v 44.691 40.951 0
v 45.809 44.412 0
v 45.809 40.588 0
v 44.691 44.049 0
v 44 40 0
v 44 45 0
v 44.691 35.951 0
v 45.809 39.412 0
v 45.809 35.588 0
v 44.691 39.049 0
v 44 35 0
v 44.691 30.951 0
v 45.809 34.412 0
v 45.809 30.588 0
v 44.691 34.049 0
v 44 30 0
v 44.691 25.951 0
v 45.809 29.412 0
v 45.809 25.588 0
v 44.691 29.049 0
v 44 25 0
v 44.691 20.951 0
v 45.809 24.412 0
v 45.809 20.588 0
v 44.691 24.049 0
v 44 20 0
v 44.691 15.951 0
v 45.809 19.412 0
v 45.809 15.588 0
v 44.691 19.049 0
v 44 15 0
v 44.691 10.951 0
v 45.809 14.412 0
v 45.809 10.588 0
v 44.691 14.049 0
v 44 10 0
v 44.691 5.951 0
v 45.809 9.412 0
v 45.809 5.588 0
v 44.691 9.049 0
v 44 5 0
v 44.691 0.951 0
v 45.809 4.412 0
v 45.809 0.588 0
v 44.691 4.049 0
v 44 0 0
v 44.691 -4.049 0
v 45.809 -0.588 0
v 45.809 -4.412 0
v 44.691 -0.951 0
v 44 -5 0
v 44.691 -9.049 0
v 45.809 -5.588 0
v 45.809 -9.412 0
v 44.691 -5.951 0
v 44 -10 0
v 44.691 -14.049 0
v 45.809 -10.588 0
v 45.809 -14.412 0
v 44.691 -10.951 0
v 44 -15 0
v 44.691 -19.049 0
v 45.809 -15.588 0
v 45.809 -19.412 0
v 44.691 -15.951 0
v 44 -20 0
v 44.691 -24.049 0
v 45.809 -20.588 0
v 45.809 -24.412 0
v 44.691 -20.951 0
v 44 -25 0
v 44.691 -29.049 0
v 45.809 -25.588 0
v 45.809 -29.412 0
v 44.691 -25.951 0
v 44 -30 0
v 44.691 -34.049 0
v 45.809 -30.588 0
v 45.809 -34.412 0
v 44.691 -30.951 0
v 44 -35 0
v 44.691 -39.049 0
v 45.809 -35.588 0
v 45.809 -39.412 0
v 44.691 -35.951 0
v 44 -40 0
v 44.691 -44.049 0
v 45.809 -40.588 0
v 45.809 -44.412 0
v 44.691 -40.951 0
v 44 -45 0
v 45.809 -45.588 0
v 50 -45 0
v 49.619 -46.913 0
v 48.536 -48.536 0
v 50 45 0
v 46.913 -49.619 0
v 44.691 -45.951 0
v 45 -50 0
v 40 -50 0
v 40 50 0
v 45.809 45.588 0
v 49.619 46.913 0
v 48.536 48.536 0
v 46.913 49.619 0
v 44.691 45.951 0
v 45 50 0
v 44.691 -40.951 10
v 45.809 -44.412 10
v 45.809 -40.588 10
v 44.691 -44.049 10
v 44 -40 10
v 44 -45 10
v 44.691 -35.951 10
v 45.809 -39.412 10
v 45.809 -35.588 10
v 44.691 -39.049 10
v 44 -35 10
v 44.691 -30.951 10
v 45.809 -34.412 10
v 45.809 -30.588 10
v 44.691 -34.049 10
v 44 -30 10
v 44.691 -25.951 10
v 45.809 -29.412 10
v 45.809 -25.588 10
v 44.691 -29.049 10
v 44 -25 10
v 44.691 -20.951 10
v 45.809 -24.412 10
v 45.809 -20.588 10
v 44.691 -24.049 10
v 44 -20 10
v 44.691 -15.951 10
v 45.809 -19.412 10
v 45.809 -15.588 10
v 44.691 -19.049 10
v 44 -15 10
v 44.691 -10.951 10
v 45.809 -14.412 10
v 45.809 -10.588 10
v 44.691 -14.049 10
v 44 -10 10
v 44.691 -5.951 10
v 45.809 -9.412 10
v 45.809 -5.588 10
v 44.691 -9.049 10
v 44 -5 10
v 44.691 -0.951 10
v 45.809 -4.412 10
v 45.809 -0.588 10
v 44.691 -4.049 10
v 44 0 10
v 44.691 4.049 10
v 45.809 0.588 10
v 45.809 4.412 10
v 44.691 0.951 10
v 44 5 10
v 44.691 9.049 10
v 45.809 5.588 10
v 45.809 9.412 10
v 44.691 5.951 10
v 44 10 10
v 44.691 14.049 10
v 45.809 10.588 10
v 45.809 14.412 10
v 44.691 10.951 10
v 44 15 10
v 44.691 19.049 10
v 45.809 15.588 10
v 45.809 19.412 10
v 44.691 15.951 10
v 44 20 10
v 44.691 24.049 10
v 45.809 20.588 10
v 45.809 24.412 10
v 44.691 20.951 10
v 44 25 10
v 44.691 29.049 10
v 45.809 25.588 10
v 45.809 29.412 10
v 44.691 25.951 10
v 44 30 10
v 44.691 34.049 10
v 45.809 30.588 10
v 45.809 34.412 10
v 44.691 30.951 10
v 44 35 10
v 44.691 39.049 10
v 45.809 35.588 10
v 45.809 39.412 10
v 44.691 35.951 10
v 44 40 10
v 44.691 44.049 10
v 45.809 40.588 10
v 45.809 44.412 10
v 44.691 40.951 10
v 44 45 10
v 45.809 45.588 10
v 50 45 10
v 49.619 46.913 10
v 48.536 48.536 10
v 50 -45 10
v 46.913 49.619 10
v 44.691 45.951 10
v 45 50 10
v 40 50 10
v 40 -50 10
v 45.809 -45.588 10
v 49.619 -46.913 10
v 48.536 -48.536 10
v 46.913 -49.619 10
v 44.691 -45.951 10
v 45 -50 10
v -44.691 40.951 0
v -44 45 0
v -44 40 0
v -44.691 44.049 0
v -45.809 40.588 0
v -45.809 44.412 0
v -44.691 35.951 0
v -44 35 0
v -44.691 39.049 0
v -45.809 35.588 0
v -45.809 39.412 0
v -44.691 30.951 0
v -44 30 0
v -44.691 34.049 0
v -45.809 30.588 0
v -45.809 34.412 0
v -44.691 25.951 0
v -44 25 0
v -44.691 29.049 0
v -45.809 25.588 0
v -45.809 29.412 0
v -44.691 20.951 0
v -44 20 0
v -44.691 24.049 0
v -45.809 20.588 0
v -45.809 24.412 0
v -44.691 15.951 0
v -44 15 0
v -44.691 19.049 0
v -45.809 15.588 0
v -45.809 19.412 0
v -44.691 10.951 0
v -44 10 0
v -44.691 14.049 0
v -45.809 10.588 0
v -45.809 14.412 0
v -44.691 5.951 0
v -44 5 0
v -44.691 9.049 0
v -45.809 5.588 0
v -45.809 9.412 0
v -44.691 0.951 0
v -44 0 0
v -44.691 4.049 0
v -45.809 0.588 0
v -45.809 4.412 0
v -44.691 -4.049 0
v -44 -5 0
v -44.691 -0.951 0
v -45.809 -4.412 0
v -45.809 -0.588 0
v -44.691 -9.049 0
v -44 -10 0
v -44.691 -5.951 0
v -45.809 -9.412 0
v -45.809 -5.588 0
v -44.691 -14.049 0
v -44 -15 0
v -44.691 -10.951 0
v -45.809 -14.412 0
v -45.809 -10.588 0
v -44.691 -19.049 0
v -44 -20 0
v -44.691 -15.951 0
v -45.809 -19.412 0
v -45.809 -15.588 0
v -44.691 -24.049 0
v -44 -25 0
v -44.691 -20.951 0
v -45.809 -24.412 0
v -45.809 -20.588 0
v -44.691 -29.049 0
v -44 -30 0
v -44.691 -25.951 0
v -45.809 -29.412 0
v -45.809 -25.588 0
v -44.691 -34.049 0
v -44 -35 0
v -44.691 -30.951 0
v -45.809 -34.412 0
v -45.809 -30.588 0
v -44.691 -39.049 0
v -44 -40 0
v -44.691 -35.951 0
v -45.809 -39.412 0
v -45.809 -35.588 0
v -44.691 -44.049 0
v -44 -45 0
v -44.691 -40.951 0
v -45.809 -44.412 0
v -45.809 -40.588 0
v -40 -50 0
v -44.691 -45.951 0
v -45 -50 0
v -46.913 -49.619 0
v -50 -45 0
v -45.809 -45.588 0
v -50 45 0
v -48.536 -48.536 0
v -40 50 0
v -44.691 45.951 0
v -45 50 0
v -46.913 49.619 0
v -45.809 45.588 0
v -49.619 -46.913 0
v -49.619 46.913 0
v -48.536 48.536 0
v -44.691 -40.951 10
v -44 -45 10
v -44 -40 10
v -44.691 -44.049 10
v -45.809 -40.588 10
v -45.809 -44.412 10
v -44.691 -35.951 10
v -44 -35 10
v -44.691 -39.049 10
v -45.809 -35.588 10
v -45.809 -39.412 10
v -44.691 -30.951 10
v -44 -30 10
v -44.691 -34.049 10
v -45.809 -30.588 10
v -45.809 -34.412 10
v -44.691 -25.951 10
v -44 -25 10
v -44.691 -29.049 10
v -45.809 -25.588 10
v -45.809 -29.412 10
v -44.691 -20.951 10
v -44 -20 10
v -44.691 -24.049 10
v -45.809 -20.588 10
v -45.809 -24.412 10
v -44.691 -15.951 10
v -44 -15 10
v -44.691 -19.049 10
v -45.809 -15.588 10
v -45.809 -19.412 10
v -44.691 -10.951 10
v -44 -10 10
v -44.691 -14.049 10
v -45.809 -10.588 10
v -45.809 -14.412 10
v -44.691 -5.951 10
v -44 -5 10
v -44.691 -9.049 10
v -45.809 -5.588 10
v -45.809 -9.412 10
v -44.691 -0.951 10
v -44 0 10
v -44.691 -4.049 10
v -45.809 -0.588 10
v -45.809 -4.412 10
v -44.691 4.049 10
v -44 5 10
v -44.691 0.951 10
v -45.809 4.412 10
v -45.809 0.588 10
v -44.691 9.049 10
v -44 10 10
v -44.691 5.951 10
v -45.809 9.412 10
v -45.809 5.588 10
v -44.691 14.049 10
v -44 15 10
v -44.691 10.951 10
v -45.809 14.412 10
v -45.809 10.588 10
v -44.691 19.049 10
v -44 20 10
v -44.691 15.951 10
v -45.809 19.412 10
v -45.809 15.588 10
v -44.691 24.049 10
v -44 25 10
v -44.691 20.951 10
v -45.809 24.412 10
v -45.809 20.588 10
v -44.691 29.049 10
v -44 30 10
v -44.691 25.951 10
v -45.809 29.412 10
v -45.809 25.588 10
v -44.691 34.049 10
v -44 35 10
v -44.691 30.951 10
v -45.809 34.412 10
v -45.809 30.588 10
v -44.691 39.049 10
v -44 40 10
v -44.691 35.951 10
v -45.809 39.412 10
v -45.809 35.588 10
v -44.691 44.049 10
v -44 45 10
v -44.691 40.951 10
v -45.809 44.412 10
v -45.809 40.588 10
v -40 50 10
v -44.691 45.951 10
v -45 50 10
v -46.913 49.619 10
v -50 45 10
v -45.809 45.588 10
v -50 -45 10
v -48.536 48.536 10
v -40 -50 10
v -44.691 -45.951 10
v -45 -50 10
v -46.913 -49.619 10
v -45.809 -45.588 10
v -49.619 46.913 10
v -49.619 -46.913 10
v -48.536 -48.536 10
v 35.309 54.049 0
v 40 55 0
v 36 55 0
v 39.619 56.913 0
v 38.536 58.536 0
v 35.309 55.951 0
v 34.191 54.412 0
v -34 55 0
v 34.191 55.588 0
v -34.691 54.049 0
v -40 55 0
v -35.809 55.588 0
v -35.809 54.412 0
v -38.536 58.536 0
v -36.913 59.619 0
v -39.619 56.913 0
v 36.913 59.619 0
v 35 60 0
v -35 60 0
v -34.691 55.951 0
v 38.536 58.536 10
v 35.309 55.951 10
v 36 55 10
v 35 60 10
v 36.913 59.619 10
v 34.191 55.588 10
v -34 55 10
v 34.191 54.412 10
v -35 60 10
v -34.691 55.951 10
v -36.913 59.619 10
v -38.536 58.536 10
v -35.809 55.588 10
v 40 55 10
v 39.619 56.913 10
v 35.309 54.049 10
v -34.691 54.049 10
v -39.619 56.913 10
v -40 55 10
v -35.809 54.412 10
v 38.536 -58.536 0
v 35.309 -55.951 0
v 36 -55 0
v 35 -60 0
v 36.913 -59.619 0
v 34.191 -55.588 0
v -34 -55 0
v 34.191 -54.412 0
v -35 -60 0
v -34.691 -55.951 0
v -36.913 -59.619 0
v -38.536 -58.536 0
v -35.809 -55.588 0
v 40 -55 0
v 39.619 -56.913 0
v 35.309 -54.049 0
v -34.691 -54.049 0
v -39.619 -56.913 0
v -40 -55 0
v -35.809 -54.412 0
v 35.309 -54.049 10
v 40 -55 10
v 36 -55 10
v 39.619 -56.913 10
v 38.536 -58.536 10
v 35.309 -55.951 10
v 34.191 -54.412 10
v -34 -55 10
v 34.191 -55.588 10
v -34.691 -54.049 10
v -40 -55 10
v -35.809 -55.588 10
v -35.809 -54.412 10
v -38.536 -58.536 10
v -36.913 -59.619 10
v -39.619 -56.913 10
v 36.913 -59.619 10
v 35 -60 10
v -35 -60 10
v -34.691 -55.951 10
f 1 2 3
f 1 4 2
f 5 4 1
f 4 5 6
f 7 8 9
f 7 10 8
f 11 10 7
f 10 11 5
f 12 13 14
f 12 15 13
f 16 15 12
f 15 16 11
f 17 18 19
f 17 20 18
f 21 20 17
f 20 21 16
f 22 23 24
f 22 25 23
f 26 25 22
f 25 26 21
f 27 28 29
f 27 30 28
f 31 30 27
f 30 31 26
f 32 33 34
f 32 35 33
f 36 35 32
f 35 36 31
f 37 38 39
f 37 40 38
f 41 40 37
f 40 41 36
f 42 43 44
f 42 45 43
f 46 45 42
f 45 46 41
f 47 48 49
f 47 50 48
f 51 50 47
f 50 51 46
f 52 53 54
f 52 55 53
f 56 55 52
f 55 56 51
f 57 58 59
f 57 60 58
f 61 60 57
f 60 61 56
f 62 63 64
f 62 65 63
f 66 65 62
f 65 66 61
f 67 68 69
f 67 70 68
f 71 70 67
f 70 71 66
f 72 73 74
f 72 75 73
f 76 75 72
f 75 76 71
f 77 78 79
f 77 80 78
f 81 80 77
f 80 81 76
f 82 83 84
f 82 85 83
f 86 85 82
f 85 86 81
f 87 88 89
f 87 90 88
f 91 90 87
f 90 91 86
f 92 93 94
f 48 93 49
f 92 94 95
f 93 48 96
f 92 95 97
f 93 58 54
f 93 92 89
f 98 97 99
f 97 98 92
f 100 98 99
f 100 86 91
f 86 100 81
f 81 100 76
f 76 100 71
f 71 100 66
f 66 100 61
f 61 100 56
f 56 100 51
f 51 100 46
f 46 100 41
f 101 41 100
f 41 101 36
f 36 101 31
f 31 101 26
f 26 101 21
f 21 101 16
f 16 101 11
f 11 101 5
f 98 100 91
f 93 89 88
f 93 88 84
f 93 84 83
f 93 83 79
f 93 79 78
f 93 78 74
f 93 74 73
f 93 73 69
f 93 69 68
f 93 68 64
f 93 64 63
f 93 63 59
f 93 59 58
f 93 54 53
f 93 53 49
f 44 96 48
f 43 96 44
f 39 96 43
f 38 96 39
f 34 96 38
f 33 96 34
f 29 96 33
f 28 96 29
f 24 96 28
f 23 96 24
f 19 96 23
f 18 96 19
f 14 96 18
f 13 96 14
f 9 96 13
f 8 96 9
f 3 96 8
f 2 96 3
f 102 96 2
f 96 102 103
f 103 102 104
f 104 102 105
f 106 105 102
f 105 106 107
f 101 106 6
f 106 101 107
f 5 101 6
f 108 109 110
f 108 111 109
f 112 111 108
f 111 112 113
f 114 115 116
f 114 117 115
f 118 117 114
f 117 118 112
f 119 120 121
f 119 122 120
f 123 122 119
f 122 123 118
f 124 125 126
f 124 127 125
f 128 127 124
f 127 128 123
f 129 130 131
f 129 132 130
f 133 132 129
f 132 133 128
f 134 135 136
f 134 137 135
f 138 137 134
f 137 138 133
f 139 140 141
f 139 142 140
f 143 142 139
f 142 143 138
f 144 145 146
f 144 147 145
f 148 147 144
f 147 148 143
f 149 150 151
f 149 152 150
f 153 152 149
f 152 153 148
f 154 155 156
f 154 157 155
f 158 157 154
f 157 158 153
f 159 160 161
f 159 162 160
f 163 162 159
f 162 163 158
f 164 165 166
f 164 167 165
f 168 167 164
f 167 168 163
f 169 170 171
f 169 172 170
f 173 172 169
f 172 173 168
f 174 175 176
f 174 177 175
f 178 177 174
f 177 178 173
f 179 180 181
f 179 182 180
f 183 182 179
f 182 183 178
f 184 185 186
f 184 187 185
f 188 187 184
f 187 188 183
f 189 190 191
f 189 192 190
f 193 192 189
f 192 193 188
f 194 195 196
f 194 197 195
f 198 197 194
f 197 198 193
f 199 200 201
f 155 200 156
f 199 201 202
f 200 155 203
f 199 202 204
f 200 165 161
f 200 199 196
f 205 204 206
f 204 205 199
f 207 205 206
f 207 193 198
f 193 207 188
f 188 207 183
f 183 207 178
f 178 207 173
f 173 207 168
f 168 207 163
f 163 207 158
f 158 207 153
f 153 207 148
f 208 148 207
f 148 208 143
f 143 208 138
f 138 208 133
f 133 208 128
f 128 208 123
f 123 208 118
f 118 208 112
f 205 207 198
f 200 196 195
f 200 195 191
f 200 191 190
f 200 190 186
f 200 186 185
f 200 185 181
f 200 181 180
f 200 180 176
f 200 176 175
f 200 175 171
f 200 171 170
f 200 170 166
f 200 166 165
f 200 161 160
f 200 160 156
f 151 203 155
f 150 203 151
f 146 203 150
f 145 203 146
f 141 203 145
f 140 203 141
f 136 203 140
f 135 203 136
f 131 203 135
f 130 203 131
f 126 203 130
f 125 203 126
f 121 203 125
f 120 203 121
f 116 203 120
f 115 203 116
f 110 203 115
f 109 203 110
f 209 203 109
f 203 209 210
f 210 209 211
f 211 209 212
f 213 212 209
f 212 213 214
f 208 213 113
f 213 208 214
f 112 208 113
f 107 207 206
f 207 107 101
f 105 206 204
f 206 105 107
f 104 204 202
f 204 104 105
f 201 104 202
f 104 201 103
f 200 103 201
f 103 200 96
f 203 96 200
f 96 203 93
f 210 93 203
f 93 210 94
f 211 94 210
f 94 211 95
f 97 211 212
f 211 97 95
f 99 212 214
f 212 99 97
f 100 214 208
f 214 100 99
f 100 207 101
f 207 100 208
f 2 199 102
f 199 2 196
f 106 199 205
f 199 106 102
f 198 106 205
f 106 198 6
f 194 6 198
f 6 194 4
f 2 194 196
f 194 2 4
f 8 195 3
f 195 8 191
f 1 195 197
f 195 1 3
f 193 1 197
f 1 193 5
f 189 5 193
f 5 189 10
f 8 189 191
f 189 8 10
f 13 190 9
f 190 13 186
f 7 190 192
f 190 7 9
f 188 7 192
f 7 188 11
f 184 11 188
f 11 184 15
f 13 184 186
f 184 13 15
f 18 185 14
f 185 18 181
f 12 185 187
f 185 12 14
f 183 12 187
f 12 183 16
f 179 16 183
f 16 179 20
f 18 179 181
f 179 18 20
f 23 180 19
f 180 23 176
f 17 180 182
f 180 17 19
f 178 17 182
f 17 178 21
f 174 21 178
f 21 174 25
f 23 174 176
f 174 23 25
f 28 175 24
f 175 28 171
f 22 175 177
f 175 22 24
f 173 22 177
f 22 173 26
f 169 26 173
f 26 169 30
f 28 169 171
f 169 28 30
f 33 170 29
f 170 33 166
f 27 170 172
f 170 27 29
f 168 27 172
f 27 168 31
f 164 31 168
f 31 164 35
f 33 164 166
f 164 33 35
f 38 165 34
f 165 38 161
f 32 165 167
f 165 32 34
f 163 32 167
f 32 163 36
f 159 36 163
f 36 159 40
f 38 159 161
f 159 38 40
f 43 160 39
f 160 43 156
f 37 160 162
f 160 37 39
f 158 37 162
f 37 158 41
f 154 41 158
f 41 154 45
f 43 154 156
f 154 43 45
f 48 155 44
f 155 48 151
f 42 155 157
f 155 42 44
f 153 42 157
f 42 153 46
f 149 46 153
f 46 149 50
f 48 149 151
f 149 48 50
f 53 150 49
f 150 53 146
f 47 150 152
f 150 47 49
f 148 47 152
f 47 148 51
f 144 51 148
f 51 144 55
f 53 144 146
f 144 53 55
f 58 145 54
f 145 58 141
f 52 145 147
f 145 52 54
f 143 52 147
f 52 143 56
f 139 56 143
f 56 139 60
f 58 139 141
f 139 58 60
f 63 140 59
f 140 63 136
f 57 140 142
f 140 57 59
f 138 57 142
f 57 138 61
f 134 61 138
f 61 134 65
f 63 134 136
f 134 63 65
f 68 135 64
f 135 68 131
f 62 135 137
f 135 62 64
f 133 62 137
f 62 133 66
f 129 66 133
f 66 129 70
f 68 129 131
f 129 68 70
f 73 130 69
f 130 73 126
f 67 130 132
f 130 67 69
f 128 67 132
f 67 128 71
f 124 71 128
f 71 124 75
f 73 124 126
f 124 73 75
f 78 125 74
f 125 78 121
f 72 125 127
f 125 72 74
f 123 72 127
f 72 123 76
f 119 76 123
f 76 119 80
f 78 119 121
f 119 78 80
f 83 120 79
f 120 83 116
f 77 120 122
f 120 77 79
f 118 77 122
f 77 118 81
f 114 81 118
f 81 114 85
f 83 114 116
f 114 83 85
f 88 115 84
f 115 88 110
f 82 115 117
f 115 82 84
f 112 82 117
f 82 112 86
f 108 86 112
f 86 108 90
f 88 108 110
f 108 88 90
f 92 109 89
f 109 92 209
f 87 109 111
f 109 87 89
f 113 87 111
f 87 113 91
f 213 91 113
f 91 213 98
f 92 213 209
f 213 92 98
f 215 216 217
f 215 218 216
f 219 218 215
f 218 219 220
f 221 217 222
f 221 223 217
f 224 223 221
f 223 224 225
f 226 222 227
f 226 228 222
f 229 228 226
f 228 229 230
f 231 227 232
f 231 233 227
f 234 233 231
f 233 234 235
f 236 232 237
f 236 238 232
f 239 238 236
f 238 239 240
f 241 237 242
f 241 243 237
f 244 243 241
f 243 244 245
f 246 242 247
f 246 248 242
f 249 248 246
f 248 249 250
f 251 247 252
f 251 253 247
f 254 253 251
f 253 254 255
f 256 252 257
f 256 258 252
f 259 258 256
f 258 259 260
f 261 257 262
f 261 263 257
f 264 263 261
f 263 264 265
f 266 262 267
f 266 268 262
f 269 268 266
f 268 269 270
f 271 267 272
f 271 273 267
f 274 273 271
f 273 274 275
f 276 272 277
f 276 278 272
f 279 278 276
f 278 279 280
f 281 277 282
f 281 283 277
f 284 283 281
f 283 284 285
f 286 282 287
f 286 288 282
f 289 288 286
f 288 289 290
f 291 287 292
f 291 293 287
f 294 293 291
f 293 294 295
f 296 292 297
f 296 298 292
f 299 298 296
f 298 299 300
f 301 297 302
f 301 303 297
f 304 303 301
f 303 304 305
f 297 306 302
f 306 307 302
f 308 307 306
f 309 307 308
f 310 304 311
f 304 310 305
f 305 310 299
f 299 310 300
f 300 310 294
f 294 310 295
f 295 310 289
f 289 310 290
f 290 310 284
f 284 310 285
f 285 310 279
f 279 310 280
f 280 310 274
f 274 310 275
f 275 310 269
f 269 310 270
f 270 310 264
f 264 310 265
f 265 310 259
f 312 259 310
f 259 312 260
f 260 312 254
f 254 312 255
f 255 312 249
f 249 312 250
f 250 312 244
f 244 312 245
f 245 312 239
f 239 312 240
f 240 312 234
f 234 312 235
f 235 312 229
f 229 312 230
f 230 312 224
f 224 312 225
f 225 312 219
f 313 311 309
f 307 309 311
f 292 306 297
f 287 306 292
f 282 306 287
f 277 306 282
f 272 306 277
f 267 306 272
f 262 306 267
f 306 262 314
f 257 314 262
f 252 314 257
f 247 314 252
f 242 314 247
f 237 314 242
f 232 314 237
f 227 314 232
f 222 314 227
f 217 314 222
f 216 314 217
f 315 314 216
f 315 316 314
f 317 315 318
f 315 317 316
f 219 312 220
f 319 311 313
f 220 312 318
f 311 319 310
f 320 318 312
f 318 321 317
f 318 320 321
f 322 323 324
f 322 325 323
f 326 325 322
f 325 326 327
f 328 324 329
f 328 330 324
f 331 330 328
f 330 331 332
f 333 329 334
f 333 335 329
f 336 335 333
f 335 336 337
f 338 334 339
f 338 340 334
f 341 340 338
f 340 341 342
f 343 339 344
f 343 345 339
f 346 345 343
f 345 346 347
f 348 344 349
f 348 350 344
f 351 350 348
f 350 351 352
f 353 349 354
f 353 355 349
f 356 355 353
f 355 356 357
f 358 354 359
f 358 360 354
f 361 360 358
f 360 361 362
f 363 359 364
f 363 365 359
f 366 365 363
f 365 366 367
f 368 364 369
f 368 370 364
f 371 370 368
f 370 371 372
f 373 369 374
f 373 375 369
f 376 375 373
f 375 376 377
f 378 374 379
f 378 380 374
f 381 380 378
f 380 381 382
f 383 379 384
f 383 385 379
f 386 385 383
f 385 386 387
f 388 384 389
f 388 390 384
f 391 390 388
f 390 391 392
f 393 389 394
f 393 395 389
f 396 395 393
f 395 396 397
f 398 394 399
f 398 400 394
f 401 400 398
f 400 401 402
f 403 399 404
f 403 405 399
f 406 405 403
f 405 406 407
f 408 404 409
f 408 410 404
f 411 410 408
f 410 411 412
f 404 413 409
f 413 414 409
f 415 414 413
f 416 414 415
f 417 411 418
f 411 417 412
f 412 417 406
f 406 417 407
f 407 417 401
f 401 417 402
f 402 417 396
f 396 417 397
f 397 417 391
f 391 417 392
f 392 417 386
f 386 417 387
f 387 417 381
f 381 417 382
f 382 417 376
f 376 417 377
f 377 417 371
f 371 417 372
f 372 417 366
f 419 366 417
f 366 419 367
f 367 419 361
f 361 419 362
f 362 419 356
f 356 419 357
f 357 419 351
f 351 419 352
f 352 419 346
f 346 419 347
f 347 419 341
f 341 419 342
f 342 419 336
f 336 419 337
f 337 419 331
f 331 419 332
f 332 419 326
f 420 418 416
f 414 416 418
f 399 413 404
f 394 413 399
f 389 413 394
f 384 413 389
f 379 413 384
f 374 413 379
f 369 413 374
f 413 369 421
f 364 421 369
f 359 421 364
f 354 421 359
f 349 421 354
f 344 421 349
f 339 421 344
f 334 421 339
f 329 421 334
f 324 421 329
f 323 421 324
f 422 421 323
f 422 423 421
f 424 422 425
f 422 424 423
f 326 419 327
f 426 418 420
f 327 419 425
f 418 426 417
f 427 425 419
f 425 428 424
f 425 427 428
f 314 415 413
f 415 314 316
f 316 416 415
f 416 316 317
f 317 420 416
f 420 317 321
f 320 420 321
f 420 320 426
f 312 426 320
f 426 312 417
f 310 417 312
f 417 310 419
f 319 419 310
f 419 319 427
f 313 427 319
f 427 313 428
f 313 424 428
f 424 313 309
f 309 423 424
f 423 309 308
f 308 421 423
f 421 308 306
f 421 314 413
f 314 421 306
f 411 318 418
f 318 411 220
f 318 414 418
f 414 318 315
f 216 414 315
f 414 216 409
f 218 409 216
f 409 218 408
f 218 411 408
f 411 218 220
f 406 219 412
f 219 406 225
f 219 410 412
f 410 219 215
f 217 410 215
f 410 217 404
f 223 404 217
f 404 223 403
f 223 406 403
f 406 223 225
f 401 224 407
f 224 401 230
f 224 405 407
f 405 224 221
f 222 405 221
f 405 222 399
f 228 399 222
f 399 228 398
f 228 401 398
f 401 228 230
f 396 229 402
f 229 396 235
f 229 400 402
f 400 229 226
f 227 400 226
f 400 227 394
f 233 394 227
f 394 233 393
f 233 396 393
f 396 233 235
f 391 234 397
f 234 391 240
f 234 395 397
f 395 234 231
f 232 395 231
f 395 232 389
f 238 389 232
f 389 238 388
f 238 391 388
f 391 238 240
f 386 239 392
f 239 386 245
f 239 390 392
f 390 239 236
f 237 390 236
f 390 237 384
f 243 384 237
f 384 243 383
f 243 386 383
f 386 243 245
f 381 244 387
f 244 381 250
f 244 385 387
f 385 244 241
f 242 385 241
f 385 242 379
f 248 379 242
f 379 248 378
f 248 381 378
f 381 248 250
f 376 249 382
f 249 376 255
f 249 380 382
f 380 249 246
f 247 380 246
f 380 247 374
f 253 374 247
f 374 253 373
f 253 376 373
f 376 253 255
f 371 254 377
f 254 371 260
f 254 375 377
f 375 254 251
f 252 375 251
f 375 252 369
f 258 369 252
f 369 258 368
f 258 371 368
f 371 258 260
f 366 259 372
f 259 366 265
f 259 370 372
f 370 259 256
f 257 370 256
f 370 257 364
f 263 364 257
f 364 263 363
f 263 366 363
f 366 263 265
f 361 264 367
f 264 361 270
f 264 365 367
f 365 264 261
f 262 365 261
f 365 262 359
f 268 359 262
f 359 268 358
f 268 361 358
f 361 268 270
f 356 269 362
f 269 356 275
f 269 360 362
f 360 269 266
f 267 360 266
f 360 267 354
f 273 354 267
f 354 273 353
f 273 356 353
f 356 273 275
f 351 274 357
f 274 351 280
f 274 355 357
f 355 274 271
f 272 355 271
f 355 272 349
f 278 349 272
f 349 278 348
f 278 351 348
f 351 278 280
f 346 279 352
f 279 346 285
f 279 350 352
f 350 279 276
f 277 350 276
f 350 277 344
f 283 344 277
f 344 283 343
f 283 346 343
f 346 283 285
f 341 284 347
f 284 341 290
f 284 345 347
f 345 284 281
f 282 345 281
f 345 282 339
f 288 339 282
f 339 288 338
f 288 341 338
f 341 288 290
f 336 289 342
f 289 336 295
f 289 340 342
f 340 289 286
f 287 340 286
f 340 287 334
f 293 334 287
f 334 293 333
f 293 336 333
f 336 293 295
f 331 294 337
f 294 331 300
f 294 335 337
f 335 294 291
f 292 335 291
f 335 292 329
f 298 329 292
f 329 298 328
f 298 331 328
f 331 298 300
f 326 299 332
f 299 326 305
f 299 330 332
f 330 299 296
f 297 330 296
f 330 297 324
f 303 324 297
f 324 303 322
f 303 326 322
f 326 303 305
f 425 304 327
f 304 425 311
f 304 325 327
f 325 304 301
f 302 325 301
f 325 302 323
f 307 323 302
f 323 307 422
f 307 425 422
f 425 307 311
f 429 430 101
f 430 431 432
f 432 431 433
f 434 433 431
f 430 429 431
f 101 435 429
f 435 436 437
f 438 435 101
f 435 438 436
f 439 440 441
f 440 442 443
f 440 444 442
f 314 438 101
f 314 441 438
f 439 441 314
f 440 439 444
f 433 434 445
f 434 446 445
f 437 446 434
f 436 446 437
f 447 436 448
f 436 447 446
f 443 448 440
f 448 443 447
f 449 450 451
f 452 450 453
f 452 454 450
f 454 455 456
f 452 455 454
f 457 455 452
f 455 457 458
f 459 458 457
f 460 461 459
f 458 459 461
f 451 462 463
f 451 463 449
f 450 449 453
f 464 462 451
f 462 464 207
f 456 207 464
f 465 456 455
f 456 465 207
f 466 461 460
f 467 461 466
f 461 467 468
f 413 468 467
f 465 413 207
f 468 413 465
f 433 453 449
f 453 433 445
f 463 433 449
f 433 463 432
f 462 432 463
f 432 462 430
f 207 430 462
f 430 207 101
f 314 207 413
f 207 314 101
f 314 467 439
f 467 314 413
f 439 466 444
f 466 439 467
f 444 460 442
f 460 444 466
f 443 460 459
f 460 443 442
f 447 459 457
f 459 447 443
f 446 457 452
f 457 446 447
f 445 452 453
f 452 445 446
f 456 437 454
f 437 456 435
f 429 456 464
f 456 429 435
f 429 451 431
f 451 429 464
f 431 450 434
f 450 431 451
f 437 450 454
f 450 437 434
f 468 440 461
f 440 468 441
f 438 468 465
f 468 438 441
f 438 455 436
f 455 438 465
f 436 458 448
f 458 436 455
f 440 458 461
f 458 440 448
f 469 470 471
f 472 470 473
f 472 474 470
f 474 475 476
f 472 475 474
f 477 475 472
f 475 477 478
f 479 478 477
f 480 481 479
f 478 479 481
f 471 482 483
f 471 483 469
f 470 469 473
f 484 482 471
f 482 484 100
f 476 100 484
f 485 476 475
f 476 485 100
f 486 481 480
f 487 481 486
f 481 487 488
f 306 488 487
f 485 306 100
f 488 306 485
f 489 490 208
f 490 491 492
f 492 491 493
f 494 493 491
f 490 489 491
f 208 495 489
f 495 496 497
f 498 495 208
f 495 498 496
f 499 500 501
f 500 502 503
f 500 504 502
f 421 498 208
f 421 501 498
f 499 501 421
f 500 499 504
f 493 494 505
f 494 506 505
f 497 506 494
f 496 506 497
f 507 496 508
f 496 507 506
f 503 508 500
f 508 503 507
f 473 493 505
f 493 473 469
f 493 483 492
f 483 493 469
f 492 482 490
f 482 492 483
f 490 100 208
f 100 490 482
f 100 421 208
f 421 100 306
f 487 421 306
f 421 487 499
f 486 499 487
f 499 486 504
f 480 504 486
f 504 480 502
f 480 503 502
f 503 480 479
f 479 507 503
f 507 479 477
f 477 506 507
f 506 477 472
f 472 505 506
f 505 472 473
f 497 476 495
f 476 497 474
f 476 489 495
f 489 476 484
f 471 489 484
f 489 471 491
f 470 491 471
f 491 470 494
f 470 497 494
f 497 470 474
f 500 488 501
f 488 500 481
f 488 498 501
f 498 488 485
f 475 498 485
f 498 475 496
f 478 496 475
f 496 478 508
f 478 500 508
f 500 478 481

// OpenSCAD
x=40;
y=50;
z=10;
altura=42; //stepper
radi=5;
f_tornillo=1;
module cantonada (){
    square(radi);
    circle(radi);
}

module part1(){
    linear_extrude(z){
            difference(){
            hull(){
                translate([0,y-radi])
                cantonada();
                translate([0,-y+radi])
                rotate([180])
                cantonada();
            }  
            translate([0,y-radi])
                circle(f_tornillo);
                translate([0,-y+radi])
                circle(f_tornillo);
            for(i=[0:5:y-radi]){
                translate([0,i])
                circle(f_tornillo);
                translate([0,-i])
                circle(f_tornillo);
                }
        }
    } 
}

module part2(){
    linear_extrude(z){
        difference(){
        hull(){
            translate([x-radi,0])
             
            cantonada();
            translate([-x+radi,0])
            rotate([0,0,90])
            cantonada();
        }
        translate([x-radi,0])
                circle(f_tornillo);
                translate([-x+radi,0])
                circle(f_tornillo);
    }
    } 
    
    
    
    
    }
    
    
    translate([x+radi,0,0])
    mirror([1,0,0])
    part1();
    translate([-x-radi,0,0])
    part1();
    translate([0,y+radi,0])
    mirror([0,1,0])
    part2();
    translate([0,-y-radi,0])  
    part2();
    
